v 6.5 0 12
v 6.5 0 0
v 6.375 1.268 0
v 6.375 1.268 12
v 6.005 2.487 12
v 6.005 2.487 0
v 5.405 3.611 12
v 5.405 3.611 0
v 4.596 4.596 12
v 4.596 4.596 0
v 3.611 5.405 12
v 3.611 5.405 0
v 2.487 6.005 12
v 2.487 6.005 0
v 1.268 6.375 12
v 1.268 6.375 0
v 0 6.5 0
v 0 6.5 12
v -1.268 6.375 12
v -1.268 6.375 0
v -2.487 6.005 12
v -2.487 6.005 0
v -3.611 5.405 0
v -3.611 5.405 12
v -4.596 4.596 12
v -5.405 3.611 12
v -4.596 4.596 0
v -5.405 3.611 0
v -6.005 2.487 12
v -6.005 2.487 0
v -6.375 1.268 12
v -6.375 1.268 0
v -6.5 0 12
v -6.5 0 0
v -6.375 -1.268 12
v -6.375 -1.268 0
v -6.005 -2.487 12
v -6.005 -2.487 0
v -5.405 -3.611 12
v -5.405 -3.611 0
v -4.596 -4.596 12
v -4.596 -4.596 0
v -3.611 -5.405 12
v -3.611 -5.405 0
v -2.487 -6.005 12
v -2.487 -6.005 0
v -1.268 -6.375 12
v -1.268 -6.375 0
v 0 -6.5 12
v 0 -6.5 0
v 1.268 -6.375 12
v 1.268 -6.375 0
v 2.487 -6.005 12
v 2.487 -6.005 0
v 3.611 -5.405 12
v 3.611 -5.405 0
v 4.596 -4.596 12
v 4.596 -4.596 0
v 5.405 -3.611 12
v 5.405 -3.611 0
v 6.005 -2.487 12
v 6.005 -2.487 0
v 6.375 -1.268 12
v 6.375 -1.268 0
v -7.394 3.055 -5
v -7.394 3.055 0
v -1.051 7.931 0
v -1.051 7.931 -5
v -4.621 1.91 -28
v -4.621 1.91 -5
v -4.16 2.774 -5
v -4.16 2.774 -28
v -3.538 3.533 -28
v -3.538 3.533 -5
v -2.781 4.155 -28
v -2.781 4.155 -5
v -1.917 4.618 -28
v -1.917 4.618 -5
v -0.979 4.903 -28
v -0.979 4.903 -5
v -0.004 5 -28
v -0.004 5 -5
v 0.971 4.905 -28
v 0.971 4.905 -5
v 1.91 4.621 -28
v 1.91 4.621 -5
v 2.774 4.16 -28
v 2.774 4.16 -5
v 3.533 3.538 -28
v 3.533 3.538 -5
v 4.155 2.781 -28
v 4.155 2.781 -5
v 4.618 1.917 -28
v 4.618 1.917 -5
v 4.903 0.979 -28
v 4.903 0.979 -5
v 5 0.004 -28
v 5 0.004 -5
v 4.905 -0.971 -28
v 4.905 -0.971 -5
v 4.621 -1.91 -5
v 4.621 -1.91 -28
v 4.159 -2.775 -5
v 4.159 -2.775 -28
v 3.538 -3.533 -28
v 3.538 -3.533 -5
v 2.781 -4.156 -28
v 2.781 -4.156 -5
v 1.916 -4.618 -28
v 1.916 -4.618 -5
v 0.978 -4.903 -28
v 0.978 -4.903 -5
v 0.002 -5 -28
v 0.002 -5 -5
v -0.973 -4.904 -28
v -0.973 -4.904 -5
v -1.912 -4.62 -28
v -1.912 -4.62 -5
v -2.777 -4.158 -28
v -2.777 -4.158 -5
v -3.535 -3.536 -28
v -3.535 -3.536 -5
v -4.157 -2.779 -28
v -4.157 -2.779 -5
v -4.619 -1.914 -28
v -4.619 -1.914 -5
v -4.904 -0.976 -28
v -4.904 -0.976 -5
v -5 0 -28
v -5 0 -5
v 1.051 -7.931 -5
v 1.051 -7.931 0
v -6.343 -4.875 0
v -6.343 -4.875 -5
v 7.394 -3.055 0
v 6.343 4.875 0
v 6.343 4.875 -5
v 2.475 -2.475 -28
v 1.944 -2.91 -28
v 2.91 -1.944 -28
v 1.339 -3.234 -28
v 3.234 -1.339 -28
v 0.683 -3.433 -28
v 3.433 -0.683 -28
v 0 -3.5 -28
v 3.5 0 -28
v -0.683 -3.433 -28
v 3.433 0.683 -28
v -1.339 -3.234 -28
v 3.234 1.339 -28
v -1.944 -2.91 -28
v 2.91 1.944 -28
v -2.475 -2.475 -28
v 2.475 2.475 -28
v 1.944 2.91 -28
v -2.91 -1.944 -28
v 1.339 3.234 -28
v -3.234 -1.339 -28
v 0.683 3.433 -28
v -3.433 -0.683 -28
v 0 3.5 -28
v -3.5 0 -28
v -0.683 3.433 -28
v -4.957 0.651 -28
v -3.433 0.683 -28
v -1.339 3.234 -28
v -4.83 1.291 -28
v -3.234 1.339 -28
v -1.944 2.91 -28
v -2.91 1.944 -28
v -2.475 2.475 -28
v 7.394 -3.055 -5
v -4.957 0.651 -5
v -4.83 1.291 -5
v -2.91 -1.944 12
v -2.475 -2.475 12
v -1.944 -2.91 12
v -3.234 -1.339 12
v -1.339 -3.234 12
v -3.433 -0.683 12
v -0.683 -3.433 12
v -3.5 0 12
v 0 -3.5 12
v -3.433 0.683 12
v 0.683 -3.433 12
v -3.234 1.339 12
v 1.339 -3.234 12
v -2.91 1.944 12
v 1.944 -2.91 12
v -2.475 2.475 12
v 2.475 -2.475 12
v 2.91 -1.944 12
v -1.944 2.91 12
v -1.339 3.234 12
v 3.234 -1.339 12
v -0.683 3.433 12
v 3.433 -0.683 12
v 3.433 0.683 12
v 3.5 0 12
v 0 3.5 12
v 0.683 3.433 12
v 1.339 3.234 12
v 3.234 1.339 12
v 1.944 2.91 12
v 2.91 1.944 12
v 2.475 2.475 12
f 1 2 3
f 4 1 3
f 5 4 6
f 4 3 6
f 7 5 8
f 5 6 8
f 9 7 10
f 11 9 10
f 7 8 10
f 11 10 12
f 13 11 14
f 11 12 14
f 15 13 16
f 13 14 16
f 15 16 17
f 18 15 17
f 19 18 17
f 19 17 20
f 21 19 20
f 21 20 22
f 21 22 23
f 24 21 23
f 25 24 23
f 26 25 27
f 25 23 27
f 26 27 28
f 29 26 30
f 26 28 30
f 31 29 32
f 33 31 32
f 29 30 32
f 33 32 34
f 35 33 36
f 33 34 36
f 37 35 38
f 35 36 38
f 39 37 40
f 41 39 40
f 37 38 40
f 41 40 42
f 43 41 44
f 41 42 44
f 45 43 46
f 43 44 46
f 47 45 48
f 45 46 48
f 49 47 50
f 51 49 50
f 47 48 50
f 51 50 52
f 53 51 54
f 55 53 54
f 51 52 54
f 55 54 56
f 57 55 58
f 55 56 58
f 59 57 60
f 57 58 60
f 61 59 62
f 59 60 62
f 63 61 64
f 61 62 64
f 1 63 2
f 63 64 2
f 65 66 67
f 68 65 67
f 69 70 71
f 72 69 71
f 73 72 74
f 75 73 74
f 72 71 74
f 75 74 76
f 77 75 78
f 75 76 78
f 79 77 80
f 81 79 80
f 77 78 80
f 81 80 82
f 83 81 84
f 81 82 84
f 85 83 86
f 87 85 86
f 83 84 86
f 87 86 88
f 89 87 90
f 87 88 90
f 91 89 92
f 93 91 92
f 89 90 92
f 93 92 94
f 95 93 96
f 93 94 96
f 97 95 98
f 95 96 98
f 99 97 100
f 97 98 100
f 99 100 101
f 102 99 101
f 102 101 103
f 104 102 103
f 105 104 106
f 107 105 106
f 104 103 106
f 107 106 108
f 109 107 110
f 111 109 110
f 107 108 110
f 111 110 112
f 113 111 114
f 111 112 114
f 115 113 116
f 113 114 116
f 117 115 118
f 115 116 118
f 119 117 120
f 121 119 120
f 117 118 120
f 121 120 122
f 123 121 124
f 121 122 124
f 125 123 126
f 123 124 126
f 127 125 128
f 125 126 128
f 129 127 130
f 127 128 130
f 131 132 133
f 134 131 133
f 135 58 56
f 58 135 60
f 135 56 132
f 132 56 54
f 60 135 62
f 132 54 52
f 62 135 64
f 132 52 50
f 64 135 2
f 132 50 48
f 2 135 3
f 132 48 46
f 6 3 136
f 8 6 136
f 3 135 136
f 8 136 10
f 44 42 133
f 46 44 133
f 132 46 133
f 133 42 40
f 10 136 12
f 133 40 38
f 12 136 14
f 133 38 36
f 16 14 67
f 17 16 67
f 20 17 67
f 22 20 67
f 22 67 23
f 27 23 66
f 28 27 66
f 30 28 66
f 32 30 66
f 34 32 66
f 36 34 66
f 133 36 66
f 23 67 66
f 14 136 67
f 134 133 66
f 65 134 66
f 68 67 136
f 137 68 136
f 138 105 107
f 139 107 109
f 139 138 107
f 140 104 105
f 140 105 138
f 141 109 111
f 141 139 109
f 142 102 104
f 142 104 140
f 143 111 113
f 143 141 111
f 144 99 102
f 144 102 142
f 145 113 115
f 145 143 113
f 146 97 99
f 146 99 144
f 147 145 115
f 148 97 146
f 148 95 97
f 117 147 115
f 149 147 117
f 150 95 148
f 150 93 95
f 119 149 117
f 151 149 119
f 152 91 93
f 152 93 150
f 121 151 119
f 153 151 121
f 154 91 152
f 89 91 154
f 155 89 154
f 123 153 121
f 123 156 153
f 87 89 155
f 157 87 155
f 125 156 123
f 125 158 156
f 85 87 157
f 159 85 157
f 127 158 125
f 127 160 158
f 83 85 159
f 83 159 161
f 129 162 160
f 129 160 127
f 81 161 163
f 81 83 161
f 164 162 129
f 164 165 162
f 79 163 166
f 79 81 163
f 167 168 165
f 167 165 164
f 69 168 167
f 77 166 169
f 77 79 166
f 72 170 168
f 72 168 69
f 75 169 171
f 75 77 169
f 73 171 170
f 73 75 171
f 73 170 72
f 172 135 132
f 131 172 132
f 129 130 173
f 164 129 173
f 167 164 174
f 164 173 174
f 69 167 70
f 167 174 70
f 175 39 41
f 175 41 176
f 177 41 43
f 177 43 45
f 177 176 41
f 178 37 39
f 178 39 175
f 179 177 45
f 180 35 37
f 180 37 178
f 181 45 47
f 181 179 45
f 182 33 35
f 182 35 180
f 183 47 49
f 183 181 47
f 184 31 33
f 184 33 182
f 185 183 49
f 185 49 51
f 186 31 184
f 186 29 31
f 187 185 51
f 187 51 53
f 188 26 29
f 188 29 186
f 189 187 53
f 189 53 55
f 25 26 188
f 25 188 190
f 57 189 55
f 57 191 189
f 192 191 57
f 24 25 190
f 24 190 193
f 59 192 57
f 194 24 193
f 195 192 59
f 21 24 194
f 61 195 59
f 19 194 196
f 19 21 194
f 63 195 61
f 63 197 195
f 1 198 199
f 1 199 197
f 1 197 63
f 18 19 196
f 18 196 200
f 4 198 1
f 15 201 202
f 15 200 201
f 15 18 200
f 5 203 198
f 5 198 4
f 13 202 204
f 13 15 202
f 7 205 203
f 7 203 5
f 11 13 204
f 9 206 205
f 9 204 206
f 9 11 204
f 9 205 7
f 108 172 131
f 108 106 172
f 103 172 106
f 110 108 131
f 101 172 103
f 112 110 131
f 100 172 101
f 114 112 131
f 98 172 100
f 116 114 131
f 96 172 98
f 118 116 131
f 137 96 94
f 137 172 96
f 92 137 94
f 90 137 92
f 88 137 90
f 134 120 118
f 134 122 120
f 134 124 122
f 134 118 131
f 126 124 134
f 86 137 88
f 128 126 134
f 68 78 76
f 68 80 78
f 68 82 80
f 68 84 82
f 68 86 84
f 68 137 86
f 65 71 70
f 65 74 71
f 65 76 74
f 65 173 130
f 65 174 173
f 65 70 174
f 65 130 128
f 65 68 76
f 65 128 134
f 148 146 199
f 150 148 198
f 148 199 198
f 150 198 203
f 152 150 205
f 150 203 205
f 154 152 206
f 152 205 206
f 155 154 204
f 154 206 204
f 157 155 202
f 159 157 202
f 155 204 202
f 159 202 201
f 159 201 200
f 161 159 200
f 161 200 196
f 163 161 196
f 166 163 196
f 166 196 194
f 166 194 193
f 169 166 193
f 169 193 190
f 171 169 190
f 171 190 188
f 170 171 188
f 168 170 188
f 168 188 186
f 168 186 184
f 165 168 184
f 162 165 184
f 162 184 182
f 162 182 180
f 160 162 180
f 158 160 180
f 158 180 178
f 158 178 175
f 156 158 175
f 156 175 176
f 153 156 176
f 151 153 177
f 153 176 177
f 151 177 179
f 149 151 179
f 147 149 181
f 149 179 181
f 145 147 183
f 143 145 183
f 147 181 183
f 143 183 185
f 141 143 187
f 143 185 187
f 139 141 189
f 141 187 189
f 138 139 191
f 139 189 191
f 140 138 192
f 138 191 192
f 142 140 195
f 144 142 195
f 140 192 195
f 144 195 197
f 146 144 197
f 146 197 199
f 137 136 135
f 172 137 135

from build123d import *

# Parameters (mm, degrees)
SKETCH1_R           = 6.5
BOSS_EXTRUDE1_DEPTH = 12
BOSS_EXTRUDE2_DEPTH = 5
BOSS_EXTRUDE3_DEPTH = 23
SKETCH4_R           = 3.5
CUT_EXTRUDE1_DEPTH  = 42.443459209


with BuildPart() as part:
    # Sketch1 → Boss-Extrude1 (new body)
    with BuildSketch(Plane.XY):
        Circle(SKETCH1_R)
    extrude(amount=BOSS_EXTRUDE1_DEPTH)

    # Sketch2 → Boss-Extrude2 (add)
    with BuildSketch(Plane(origin=(0, 0, 0), x_dir=(-1, 0, 0), z_dir=(0, 0, -1))):
        Polygon((-7.393524213, -3.055454092), (-1.050661243, -7.930706838), (6.342862971, -4.875252746), (7.393524213, 3.055454092), (1.050661243, 7.930706838), (-6.342862971, 4.875252746), align=None)
    extrude(amount=BOSS_EXTRUDE2_DEPTH)

    # Sketch3 → Boss-Extrude3 (add)
    with BuildSketch(Plane(origin=(0, 0, -5), x_dir=(-1, 0, 0), z_dir=(0, 0, -1))):
        with BuildLine():
            ThreePointArc((4.620952633, 1.909658808), (-1.909658808, 4.620952633), (-4.620952633, -1.909658808))
            Line((-4.620952633, -1.909658808), (4.620952633, 1.909658808))
        make_face()
        with BuildLine():
            Line((4.620952633, 1.909658808), (-4.620952633, -1.909658808))
            ThreePointArc((-4.620952633, -1.909658808), (0.973456941, -4.904322745), (5, 0))
            ThreePointArc((5, 0), (4.904322745, 0.973456941), (4.620952633, 1.909658808))
        make_face()
    extrude(amount=BOSS_EXTRUDE3_DEPTH)

    # Sketch4 → Cut-Extrude1 (cut, through all)
    with BuildSketch(Plane.XY.offset(12)):
        Circle(SKETCH4_R)
    extrude(amount=-CUT_EXTRUDE1_DEPTH, mode=Mode.SUBTRACT)


solid = part.part
